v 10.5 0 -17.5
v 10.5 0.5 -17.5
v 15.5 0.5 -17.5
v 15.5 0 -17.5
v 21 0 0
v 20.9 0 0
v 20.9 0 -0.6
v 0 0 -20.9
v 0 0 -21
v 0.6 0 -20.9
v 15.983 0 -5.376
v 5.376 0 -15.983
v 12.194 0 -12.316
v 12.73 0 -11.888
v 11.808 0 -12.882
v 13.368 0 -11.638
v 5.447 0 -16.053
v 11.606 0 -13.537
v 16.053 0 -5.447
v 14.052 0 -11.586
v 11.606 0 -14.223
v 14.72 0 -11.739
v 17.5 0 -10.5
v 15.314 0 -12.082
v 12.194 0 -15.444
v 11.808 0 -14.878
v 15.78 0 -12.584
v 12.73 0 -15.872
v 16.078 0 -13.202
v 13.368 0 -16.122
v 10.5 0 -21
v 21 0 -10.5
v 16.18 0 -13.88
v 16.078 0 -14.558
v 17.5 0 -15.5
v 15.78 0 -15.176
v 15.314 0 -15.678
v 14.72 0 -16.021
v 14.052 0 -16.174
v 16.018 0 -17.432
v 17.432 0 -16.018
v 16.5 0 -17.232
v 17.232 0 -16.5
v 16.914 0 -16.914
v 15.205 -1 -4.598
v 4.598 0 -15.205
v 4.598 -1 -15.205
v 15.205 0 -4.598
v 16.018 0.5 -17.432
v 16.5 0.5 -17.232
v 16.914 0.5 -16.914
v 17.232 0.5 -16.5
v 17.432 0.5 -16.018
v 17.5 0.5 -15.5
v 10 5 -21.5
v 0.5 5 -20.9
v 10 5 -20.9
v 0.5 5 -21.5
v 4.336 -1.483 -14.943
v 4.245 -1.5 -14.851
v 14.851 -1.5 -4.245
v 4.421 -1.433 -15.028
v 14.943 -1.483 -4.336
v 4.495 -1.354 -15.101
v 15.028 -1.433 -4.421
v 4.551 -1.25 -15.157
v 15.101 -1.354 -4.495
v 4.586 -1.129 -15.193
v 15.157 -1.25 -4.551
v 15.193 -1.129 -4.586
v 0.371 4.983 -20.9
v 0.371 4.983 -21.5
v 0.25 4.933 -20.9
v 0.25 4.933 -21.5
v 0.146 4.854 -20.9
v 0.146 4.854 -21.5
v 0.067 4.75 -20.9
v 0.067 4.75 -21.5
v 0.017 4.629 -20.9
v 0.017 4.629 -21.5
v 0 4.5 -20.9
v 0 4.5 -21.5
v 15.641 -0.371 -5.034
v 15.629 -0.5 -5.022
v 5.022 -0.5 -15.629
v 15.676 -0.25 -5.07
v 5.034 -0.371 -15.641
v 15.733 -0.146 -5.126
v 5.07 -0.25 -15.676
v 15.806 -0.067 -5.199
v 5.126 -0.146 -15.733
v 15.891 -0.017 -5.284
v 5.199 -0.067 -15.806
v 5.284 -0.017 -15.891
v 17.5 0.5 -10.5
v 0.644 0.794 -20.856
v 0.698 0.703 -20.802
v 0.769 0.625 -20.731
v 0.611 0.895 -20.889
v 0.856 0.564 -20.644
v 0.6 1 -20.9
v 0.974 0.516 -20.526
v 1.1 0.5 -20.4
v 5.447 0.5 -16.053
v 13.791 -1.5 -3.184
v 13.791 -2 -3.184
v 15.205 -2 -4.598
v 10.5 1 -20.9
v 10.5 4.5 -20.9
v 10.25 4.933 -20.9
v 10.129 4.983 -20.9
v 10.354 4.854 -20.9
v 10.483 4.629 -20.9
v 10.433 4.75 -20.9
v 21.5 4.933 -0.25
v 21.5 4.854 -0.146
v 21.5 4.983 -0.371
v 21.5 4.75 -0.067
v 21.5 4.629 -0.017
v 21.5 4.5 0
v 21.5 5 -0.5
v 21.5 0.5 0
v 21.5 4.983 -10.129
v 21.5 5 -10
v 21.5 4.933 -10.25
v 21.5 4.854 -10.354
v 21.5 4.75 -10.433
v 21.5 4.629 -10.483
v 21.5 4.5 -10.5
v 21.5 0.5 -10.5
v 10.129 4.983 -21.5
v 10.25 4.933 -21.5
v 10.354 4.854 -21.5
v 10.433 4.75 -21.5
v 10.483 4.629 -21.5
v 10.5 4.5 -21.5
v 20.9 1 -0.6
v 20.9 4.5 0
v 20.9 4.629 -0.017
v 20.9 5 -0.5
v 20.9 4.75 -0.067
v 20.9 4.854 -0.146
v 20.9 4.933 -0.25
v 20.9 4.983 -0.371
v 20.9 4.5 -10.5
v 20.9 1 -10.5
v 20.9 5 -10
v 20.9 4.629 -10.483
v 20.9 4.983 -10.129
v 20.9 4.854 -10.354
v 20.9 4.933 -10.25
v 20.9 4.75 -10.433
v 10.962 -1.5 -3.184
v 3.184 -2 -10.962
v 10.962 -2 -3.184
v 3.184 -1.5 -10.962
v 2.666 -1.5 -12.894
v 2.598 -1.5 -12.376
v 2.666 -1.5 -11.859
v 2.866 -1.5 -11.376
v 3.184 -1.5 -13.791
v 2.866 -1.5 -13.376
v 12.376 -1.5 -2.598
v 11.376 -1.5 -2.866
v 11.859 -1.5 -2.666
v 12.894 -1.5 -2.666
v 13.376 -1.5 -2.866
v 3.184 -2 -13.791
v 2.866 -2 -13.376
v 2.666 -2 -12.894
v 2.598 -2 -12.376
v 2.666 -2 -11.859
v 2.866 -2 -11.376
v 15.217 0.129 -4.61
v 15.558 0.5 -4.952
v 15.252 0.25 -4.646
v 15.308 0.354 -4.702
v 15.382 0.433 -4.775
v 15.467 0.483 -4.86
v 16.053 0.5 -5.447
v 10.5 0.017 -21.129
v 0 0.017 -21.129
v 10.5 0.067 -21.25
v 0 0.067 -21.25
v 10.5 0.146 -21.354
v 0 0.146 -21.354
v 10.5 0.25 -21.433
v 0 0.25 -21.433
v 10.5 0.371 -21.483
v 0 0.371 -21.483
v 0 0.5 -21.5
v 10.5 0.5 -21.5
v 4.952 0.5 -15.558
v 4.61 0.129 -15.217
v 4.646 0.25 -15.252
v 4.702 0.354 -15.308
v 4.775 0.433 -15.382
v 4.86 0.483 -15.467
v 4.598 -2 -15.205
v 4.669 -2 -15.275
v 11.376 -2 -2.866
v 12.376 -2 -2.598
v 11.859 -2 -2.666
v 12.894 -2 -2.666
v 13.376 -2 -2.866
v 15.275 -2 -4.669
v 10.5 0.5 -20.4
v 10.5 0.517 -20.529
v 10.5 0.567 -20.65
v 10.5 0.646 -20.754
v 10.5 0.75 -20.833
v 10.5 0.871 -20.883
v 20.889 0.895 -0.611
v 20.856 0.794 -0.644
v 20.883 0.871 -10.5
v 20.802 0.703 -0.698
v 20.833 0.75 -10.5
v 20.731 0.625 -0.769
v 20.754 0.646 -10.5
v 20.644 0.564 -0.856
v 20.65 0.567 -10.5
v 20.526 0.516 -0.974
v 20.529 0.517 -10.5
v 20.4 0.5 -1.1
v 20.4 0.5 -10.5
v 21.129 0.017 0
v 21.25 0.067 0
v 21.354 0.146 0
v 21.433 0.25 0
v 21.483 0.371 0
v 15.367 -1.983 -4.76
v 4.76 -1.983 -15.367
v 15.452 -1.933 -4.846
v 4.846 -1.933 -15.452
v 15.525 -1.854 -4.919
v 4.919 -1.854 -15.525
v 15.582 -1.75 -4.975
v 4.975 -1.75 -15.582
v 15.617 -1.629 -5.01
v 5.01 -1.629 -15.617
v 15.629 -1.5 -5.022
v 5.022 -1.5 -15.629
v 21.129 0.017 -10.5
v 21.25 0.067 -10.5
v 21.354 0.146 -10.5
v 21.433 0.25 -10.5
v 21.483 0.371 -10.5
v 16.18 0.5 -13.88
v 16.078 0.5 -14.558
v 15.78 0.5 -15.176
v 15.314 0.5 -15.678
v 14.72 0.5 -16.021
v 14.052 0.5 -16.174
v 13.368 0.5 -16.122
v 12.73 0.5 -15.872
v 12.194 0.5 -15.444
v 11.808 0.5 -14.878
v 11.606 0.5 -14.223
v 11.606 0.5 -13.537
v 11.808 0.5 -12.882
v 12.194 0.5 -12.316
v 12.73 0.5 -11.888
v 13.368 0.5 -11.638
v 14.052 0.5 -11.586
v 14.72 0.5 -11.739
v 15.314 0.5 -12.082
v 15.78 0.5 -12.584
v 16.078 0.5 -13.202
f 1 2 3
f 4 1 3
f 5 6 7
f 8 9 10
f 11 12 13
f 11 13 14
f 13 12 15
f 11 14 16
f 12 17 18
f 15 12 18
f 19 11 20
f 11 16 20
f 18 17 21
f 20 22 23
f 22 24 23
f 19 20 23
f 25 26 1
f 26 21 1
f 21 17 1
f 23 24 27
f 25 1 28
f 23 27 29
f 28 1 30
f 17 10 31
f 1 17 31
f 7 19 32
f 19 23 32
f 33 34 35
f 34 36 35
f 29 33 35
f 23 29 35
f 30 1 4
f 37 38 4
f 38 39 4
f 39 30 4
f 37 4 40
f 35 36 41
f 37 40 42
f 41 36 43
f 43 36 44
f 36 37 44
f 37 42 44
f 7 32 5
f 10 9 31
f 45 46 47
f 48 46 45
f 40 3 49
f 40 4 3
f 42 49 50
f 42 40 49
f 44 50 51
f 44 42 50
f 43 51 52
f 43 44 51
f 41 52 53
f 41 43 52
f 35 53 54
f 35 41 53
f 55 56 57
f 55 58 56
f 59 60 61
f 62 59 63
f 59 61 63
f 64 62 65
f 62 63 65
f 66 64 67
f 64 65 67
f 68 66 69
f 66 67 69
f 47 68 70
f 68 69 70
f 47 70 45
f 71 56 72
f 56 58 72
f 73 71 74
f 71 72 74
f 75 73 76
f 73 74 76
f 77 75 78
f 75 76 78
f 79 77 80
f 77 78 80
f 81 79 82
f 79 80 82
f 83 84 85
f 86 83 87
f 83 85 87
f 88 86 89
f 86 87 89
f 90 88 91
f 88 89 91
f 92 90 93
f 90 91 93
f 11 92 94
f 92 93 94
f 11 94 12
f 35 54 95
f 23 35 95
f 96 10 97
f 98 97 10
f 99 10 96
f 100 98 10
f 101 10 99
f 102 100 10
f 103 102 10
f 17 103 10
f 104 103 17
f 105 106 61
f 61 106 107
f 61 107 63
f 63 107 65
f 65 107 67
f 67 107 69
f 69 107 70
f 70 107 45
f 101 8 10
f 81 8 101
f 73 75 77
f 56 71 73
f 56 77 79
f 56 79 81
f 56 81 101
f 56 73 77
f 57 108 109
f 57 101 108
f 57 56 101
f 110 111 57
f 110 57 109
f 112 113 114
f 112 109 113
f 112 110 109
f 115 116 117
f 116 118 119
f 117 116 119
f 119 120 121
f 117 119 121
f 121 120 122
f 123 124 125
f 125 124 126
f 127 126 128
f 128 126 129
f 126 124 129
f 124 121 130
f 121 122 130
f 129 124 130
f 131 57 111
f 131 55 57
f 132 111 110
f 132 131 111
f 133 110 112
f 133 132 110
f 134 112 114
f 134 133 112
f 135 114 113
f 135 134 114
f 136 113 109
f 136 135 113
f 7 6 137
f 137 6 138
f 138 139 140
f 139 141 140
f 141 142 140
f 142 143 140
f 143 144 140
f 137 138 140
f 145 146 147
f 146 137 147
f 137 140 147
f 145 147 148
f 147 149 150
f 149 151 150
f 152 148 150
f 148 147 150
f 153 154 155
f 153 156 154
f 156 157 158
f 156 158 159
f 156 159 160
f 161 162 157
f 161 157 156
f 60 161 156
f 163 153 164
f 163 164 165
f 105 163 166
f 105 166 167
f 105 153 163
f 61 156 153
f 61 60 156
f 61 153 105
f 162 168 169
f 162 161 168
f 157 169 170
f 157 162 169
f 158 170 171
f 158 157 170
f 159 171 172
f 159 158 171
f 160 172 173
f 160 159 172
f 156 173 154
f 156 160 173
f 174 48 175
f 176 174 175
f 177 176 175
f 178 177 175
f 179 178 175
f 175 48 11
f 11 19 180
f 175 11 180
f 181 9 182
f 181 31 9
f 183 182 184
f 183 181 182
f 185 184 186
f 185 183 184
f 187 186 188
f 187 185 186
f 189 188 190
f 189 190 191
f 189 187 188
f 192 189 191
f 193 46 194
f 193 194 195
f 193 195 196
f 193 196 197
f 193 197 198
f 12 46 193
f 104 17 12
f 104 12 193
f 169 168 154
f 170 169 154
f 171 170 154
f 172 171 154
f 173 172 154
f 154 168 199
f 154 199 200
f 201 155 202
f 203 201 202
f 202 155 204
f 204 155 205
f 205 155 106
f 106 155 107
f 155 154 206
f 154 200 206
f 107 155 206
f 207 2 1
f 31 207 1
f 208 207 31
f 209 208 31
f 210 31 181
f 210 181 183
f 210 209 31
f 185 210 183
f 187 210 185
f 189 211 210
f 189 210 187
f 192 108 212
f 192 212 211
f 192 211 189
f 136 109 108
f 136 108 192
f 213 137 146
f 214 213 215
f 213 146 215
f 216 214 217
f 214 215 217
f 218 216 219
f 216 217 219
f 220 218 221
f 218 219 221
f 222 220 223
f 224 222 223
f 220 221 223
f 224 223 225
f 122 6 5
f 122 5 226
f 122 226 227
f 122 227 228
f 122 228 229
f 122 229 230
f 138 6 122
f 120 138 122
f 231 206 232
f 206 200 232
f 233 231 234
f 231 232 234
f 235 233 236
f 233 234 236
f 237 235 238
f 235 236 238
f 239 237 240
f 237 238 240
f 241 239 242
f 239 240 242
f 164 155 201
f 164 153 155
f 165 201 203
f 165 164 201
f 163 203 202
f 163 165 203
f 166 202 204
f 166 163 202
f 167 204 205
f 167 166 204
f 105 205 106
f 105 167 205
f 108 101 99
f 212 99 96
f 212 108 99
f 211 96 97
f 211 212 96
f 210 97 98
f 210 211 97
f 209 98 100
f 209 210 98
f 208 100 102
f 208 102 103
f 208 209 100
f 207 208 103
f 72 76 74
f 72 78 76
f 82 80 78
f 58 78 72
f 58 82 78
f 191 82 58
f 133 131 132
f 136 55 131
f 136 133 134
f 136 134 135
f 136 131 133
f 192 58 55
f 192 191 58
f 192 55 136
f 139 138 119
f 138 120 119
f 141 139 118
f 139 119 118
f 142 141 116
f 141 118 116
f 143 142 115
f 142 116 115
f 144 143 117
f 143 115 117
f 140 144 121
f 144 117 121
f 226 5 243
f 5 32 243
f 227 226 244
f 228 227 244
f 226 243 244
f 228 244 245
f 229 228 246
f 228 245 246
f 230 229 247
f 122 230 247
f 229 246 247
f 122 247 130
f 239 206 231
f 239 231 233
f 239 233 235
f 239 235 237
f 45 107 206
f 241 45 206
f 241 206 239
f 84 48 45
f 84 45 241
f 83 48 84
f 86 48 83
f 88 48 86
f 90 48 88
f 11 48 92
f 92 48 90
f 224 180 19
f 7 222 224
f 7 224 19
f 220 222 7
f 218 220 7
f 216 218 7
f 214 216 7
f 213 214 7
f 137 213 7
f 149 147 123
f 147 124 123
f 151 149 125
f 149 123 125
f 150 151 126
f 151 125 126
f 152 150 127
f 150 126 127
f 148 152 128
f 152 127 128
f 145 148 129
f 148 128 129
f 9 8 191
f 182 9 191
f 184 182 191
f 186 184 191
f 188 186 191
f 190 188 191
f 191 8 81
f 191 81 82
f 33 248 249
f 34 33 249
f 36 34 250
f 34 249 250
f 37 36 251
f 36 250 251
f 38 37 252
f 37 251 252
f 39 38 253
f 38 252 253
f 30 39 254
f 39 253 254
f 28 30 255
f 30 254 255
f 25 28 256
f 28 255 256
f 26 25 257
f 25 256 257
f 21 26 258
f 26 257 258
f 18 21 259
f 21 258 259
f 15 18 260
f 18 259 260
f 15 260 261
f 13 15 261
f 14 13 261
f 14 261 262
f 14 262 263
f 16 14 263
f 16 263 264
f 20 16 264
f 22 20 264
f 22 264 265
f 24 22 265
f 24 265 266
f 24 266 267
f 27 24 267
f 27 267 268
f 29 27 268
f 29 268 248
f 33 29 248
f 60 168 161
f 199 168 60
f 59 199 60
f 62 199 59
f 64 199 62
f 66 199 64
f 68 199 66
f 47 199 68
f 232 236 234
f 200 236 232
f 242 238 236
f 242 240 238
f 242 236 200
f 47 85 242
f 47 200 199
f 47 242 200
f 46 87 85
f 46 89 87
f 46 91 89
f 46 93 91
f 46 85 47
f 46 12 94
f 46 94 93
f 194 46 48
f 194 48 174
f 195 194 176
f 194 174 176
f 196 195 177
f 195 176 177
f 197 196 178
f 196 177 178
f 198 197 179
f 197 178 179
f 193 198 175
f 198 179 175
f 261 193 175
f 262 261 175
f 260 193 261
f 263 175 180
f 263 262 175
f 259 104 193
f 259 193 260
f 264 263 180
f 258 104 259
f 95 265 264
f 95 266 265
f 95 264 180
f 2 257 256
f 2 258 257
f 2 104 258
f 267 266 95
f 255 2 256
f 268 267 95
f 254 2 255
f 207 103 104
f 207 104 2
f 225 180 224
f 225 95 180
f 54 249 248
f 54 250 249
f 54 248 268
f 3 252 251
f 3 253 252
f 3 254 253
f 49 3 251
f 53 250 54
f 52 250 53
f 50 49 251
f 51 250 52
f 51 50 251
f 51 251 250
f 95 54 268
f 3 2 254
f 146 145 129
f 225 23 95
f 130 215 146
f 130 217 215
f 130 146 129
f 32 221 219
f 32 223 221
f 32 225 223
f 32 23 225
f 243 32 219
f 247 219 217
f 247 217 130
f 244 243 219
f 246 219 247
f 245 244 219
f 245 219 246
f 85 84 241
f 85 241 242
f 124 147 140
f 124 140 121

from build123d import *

# Parameters (mm, degrees)
SKETCH1_W                = 21.5
SKETCH1_H                = 21.5
BOSS_EXTRUDE1_DEPTH      = 0.5
SKETCH2_R                = 2.3
SKETCH2_W                = 4
SKETCH2_H                = 4
SKETCH2_H_2              = 7
SKETCH2_W_2              = 7
CUT_EXTRUDE1_DEPTH       = 1.5
FILLET1_R                = 2
SKETCH3_W                = 0.6
SKETCH3_H                = 10.5
SKETCH3_W_2              = 10.5
SKETCH3_H_2              = 0.6
BOSS_EXTRUDE2_DEPTH      = 4.5
BOSS_EXTRUDE2_DEPTH_BACK = 0.5
FILLET11_R               = 0.5
SKETCH6_W                = 15
SKETCH6_H                = 0.5
BOSS_EXTRUDE3_DEPTH      = 1.2
BOSS_EXTRUDE4_DEPTH      = 2
SKETCH9_W                = 15
SKETCH9_H                = 0.5
BOSS_EXTRUDE5_DEPTH      = 4
FILLET12_R               = 0.5
FILLET13_R               = 2


with BuildPart() as part:
    # Sketch1 → Boss-Extrude1 (new body)
    with BuildSketch(Plane(origin=(0, 0, 0), x_dir=(1, 0, 0), z_dir=(0, 1, 0))):
        with Locations((10.75, 10.75)):
            Rectangle(SKETCH1_W, SKETCH1_H)
    extrude(amount=BOSS_EXTRUDE1_DEPTH)

    # Sketch2 → Cut-Extrude1 (cut, through all)
    with BuildSketch(Plane(origin=(0, 0.5, 0), x_dir=(1, 0, 0), z_dir=(0, 1, 0))):
        Polygon((0, 21.5), (21.5, 0), (0, 0), align=None)
        with Locations((13.88, 13.88)):
            Circle(SKETCH2_R)
        with Locations((19.5, 19.5)):
            Rectangle(SKETCH2_W, SKETCH2_H)
        with Locations((19.5, 14)):
            Rectangle(SKETCH2_W, SKETCH2_H_2)
        with Locations((14, 19.5)):
            Rectangle(SKETCH2_W_2, SKETCH2_H)
    extrude(amount=-CUT_EXTRUDE1_DEPTH, mode=Mode.SUBTRACT)

    # Fillet1
    fillet1_edges = [part.edges().sort_by_distance(p)[0] for p in [
        (17.5, 0.25, -17.5),
    ]]
    fillet(fillet1_edges, radius=FILLET1_R)

    # Sketch3 → Boss-Extrude2 (add, two sides)
    with BuildSketch(Plane(origin=(0, 0.5, 0), x_dir=(1, 0, 0), z_dir=(0, 1, 0))) as boss_extrude2_sk:
        with Locations((21.2, 5.25)):
            Rectangle(SKETCH3_W, SKETCH3_H)
        with Locations((5.25, 21.2)):
            Rectangle(SKETCH3_W_2, SKETCH3_H_2)
    extrude(amount=BOSS_EXTRUDE2_DEPTH)
    extrude(boss_extrude2_sk.sketch, amount=-BOSS_EXTRUDE2_DEPTH_BACK)

    # Fillet11
    fillet11_edges = [part.edges().sort_by_distance(p)[0] for p in [
        (5.25, 0, -21.5),
        (21.5, 0, -5.25),
        (20.9, 0.5, -5.55),
        (21.2, 5, -10.5),
        (21.2, 5, 0),
        (5.55, 0.5, -20.9),
        (10.5, 5, -21.2),
        (0, 5, -21.2),
    ]]
    fillet(fillet11_edges, radius=FILLET11_R)

    # Sketch6 → Boss-Extrude3 (add)
    with BuildSketch(Plane(origin=(10.75, 0, -10.75), x_dir=(0.707106781, 0, 0.707106781), z_dir=(-0.707106781, 0, 0.707106781))):
        with Locations((0, 0.25)):
            Rectangle(SKETCH6_W, SKETCH6_H)
    extrude(amount=BOSS_EXTRUDE3_DEPTH)

    # Sketch8 → Boss-Extrude4 (add)
    with BuildSketch(Plane.XZ):
        Polygon((4.598171004, -15.204772721), (15.204772721, -4.598171004), (15.62903679, -5.022435072), (5.022435072, -15.62903679), align=None)
    extrude(amount=BOSS_EXTRUDE4_DEPTH)

    # Sketch9 → Boss-Extrude5 (add)
    with BuildSketch(Plane(origin=(9.901471863, 0, -9.901471863), x_dir=(0.707106781, 0, 0.707106781), z_dir=(-0.707106781, 0, 0.707106781))):
        with Locations((0, -1.75)):
            Rectangle(SKETCH9_W, SKETCH9_H)
    extrude(amount=BOSS_EXTRUDE5_DEPTH)

    # Fillet12
    fillet12_edges = [part.edges().sort_by_distance(p)[0] for p in [
        (9.901471863, 0.5, -9.901471863),
        (10.325735931, 0, -10.325735931),
        (10.325735931, -2, -10.325735931),
        (9.901471863, -1.5, -9.901471863),
    ]]
    fillet(fillet12_edges, radius=FILLET12_R)

    # Fillet13
    fillet13_edges = [part.edges().sort_by_distance(p)[0] for p in [
        (1.769743879, -1.75, -12.376345597),
        (12.376345597, -1.75, -1.769743879),
    ]]
    fillet(fillet13_edges, radius=FILLET13_R)


solid = part.part
